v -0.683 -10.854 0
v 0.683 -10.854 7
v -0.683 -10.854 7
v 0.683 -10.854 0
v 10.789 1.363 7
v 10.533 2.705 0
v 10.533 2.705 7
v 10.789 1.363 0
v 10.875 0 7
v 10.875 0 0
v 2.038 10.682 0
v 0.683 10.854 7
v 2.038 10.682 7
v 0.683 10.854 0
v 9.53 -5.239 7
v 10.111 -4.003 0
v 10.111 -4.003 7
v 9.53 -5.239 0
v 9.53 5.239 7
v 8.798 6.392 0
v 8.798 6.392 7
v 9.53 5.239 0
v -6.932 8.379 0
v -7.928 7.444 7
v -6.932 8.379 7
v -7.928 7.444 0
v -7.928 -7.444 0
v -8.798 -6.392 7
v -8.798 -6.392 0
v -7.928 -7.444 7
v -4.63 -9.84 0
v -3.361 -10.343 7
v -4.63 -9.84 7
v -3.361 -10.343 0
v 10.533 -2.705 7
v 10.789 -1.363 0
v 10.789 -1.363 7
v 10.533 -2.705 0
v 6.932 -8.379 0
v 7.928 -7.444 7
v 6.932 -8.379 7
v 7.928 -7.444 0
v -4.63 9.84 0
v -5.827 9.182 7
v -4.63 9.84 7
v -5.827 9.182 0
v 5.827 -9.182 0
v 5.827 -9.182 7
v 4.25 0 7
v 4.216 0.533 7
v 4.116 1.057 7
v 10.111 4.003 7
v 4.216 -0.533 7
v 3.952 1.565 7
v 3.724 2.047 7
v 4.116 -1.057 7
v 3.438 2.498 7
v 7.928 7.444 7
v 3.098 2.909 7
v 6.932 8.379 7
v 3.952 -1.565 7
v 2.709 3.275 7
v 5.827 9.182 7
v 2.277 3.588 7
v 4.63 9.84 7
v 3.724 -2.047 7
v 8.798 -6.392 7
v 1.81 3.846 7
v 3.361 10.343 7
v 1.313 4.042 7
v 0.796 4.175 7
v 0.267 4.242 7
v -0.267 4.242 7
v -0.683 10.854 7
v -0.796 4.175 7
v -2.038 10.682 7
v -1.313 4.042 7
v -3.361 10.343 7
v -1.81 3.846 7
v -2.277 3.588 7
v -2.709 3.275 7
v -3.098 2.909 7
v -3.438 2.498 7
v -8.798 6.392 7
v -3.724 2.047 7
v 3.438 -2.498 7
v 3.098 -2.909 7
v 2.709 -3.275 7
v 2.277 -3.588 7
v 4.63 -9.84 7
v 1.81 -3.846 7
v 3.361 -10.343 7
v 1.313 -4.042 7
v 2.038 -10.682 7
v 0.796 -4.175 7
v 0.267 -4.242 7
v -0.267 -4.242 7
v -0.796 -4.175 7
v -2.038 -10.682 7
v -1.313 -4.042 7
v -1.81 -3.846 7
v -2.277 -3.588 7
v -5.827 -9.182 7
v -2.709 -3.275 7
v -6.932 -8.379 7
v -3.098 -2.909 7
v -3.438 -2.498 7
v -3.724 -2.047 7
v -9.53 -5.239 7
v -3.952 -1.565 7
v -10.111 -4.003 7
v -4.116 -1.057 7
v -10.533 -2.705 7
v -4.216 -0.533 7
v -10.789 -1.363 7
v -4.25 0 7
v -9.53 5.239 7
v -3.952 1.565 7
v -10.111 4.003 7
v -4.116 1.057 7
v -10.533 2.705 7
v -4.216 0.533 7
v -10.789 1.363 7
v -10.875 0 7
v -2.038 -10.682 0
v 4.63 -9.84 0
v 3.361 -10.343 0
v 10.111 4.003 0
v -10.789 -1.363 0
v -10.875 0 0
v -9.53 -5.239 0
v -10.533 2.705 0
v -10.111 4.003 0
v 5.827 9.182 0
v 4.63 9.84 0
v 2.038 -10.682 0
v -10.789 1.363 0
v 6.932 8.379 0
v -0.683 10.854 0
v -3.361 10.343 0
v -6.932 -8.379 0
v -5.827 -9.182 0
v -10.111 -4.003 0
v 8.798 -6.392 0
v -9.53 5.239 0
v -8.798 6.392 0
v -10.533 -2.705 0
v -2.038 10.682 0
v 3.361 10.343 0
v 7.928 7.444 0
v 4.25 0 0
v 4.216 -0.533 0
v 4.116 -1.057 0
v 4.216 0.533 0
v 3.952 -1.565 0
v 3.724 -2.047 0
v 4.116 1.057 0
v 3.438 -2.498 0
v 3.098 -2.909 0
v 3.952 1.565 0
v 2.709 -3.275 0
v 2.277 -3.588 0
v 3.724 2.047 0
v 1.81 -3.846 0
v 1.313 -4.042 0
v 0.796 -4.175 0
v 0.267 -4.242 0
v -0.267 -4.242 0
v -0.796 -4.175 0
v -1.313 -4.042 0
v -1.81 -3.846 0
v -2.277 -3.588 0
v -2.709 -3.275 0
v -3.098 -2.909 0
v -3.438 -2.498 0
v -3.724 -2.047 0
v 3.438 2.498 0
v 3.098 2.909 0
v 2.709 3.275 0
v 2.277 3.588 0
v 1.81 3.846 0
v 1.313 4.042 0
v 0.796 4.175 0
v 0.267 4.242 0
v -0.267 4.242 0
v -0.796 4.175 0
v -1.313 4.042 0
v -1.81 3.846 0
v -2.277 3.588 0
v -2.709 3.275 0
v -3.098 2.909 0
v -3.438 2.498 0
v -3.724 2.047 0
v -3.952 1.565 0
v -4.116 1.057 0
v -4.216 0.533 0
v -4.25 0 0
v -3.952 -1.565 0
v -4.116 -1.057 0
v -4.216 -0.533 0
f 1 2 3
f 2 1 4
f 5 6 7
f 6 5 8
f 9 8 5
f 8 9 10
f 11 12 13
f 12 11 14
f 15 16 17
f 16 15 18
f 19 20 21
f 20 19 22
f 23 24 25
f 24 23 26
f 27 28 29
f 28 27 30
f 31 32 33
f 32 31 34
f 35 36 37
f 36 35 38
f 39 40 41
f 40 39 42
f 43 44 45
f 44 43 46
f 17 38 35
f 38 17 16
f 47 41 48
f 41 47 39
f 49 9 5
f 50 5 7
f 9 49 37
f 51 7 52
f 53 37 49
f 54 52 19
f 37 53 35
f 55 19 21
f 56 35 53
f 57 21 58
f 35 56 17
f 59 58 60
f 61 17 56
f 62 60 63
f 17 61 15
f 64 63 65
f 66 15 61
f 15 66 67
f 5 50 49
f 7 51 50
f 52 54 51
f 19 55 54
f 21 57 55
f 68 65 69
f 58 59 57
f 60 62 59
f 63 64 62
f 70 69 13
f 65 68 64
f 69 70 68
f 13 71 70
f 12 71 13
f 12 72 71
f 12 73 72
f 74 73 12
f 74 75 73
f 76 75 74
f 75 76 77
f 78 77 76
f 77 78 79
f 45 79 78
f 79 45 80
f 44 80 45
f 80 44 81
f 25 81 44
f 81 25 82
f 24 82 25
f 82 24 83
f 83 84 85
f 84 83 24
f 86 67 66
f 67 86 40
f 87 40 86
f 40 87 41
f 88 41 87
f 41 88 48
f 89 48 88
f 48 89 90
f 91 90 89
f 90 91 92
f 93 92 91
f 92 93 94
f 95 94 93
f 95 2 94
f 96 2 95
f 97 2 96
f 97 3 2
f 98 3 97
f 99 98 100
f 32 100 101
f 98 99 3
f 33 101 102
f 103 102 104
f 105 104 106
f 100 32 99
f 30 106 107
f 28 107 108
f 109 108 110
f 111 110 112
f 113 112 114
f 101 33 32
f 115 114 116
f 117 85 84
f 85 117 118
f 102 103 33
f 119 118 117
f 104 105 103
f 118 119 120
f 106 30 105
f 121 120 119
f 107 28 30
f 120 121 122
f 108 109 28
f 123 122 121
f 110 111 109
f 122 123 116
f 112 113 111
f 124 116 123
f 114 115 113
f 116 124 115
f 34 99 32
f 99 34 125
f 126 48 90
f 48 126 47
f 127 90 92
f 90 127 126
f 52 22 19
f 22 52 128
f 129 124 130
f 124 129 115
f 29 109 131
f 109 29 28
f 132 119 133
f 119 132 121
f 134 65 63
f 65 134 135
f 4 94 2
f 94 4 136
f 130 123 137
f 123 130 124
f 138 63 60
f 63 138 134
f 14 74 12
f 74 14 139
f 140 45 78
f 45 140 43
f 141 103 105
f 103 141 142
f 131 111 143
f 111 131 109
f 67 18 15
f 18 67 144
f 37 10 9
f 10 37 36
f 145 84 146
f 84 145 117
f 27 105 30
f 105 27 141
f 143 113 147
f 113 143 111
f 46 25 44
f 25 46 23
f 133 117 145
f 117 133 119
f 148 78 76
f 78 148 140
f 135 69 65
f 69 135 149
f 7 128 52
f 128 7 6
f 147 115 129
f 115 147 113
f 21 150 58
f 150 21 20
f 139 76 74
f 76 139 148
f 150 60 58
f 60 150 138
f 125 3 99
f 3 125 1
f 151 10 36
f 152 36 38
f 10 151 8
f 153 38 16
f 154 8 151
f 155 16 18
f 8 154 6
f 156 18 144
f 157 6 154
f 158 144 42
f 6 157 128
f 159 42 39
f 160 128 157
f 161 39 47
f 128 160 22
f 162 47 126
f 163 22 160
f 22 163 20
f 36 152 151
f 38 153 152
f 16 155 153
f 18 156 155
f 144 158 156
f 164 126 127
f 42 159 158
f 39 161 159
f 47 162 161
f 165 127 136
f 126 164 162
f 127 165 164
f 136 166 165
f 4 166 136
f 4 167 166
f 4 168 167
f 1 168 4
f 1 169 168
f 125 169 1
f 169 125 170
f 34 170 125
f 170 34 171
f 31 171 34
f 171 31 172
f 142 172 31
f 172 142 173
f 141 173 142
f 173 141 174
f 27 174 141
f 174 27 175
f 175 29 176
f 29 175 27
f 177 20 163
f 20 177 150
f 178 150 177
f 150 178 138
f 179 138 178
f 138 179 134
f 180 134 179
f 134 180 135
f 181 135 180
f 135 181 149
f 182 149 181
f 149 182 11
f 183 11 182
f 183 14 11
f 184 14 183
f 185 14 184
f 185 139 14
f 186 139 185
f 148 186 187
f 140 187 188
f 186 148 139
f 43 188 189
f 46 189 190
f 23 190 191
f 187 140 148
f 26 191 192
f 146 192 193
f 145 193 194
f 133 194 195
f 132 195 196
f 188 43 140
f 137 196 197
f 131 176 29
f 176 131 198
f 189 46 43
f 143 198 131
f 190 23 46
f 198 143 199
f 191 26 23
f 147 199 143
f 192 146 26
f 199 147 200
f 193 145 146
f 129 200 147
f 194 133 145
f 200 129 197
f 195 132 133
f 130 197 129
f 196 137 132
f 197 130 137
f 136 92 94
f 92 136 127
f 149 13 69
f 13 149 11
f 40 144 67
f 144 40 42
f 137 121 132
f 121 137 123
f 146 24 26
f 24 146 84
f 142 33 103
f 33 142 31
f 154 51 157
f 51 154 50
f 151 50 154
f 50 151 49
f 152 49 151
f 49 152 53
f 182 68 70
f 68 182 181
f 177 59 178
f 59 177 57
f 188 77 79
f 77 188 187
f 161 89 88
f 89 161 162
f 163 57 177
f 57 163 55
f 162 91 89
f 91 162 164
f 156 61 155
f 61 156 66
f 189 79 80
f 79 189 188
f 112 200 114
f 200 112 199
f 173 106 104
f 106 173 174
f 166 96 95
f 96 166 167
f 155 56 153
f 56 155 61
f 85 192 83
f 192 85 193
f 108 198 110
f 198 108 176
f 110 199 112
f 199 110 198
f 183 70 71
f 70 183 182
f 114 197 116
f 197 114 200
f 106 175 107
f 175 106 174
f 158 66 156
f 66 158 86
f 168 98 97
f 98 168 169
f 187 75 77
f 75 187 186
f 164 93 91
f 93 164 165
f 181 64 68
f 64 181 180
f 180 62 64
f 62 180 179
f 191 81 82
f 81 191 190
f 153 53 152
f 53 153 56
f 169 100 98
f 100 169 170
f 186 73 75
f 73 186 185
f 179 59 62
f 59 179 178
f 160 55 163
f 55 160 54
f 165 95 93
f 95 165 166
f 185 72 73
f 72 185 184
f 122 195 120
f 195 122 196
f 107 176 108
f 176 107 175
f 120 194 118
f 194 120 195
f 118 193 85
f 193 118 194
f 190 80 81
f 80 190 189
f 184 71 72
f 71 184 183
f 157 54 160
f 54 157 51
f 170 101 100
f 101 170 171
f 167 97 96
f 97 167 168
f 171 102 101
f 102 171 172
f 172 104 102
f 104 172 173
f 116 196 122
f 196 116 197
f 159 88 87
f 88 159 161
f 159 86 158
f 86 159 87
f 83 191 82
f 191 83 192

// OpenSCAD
// Bearing Customiser (http://www.thingiverse.com/thing:313437)
// *********************************************************************************
// Version history:
// Author:			Date: 			Description:
// Whitecoat		2014-04-28		Initial build
// 
// *********************************************************************************
// customiser script

// Bearing Part Number
PartNo = 608;  // [ 603,  604, 605,606, 607, 608, 609, 623, 624, 625, 626, 627, 628, 629, 633, 634, 635, 636, 637, 638, 639, 673, 674, 675, 676, 677,  678,  683,  684,  685,  686,  687,  688,  689,  693,  694,  695,  696,  697,  698,  699,  6000, 6001, 6002, 6003, 6004, 6005, 6006, 6007, 6008, 6009, 6010, 6011, 6012, 6013, 6014, 6015, 6016, 6017, 6018, 6019, 6020, 6021, 6022, 6024, 6026, 6028, 6030, 6200, 6201, 6202, 6203, 6204, 6205, 6206, 6207, 6208, 6209, 6210, 6211, 6212, 6213, 6214, 6215, 6216, 6217, 6218, 6219, 6220, 6221, 6222, 6224, 6226, 6228, 6230, 6300, 6301, 6302, 6303, 6304, 6305, 6306, 6307, 6308, 6309, 6310, 6311, 6312, 6313, 6314, 6315, 6316, 6317, 6318, 6319, 6320, 6321, 6322, 6324, 6326, 6328, 6330, 6701, 6702, 6703, 6704, 6705, 6706, 6707, 6800, 6801, 6802, 6803, 6804, 6805, 6806, 6807, 6808, 6809, 6810, 6811, 6812, 6813, 6814, 6815, 6816, 6817, 6818, 6819, 6820, 6821, 6822, 6824, 6826, 6828, 6830, 6200, 6201, 6202, 6203, 6204, 6205, 6206, 6207, 6208, 6209, 6210, 6211, 6212, 6213, 6214, 6215, 6216, 6217, 6218, 6219, 6220, 6221, 6222, 6224, 6226, 6228, 6230, 6300, 6301, 6302, 6303, 6304, 6305, 6306, 6307, 6308, 6309, 6310, 6311, 6312, 6313, 6314, 6315, 6316, 6317, 6318, 6319, 6320, 6321, 6322, 6324, 6326, 6328, 6330, 6701, 6702, 6703, 6704,  6705, 6706, 6707, 6800, 6801, 6802, 6803, 6804, 6805, 6806, 6807, 6808, 6809, 6810, 6811, 6812, 6813, 6814, 6815, 6816, 6817, 6818, 6819, 6820, 6821, 6822, 6824, 6826, 6828, 6830, 6900, 6901, 6902, 6903, 6904, 6905, 6906, 6907, 6908, 6909, 6910, 6911, 6912, 6913, 6914, 6915, 6916, 6917, 6918, 6919, 6920, 6921, 6922, 6924, 6926, 6928, 6930, 16001, 16002, 16003, 16004, 16005, 16006, 16007, 16008, 16009, 16010, 16011, 16012, 16013, 16014, 16015, 16016, 16017, 16018, 16019, 16020, 16021, 16022 ]
 

// Printer Tolerance (in mm).  This makes the print just a bit smaller to account for inaccuracy in printing. 
PrintTolerance = 0.25; 

fake_bearing(BearingPartNoToDim(PartNo),PrintTolerance);


// *********************************************************************************
//  Pasted in a bearing library below this point so that there was a single script 
//  for the customiser app
// *********************************************************************************


// Bearing Library
// *********************************************************************************
// Version history:
// Author:			Date: 			Description:
// Whitecoat		2014-02-21		Initial build
// 
// *********************************************************************************
// Included Functions:
// [d, D, B] = BearingPartNoToDim(PartNo);  	//Returns Dimensions given Part Number
//
// *********************************************************************************
// Public Modules:
// fake_bearing([d, D, B],Tolerance);  	 	//Creates Bearing shape for given dimensions
//															// or: fake_bearing(BearingPartNoToDim(608));
// 
// BearingHole(p_bearing_size,p_tolerance)
// *********************************************************************************
// *********************************************************************************
// Included Internal Modules:
//	FakeBearingTest1();  			//Unit Test 1 - Fake Bearing

module FakeBearingTest1()
	{
	Tolerance = 1.0; 		
	fake_bearing([9,12,2],Tolerance);
	}




// build a fake bearing using size vector [d (Inner Diamater), D (Outer Diamater), B (Width)]
// ----------------------------------------------------------------
// This module just creates a cored cylinder in the same of a bearing.
module fake_bearing(p_bearing_size,p_tolerance=0.25)
	{
	// internal parameters
	l_diff_tol = 0.1;  	// a tollerance added to difference operations 
							 	// to ensure surface is subtracted

	// build
	difference()
		{
		cylinder(r=(p_bearing_size[1]-p_tolerance)/2,h=p_bearing_size[2],$fn=50);
		translate([0,0,-l_diff_tol])
			{
			cylinder(r=(p_bearing_size[0])/2+p_tolerance,h=p_bearing_size[2]+l_diff_tol*2,$fn=50);
			}
		}
	}

// BearingHole [d (Inner Diamater), D (Outer Diamater), B (Width)]
// ----------------------------------------------------------------
// This module is intended for subtraction in a difference to make a hole for a bearing
module BearingHole(p_bearing_size,p_tolerance=0.25)
	{
	// internal parameters
	l_diff_tol = 0.1;  	// a tollerance added to difference operations 
							 	// to ensure surface is subtracted

	// build
	difference()
		{
		cylinder(r=(p_bearing_size[1]+p_tolerance)/2,h=p_bearing_size[2],$fn=50);
		}
	}

// bearing PartNo to Dimension conversion - result [d, D, B] in mm
// ----------------------------------------------------------------
// I did find something like this in the generic bearing library with MCAD, but 
// it had a farily limited set of part numbers, I wanted a more complete 
// table for this purpose, so I wrote my own.
function BearingPartNoToDim(PartNo) =
// 600 series (ZZ)
	PartNo == 603 ? [3, 9,  5]:
	PartNo == 604 ? [4, 12, 4]:
	PartNo == 605 ? [5, 14, 5]:
	PartNo == 606 ? [6, 17, 6]:
	PartNo == 607 ? [7, 19, 6]:
	PartNo == 608 ? [8, 22, 7]:
	PartNo == 609 ? [9, 24, 7]:
	PartNo == 623 ? [3, 10, 4]:
	PartNo == 624 ? [4, 13, 5]:
	PartNo == 625 ? [5, 16, 5]:
	PartNo == 626 ? [6, 19, 6]:
	PartNo == 627 ? [7, 22, 7]:
	PartNo == 628 ? [8, 22, 7]:
	PartNo == 629 ? [9, 22, 7]:
	PartNo == 633 ? [3, 13, 5]:
	PartNo == 634 ? [4, 16, 5]:
	PartNo == 635 ? [5, 19, 6]:
	PartNo == 636 ? [6, 22, 7]:
	PartNo == 637 ? [7, 26, 9]:
	PartNo == 638 ? [8, 28, 9]:
	PartNo == 639 ? [9, 30, 10]:
	PartNo == 673 ? [3, 6, 2.5]:
	PartNo == 674 ? [4, 7, 2.5]:
	PartNo == 675 ? [5, 8, 2.5]:
	PartNo == 676 ? [6, 10, 3]:
	PartNo == 677 ? [7, 11, 3]:
	PartNo == 678 ? [8, 12, 3.5]:
	PartNo == 683 ? [3, 7, 3]:
	PartNo == 684 ? [4, 9, 4]:
	PartNo == 685 ? [5, 11, 5]:
	PartNo == 686 ? [6, 13, 5]:
	PartNo == 687 ? [7, 14, 5]:
	PartNo == 688 ? [8, 16, 5]:
	PartNo == 689 ? [9, 17, 5]:
	PartNo == 693 ? [3, 8, 4]:
	PartNo == 694 ? [4, 11, 4]:
	PartNo == 695 ? [5, 13, 4]:
	PartNo == 696 ? [6, 15, 5]:
	PartNo == 697 ? [7, 17, 5]:
	PartNo == 698 ? [8, 19, 6]:
	PartNo == 699 ? [9, 20, 6]:
	PartNo == 6000 ? [10,  26,  8]:
	PartNo == 6001 ? [12,  28,  8]:
	PartNo == 6002 ? [15,  32,  9]:
	PartNo == 6003 ? [17,  35,  10]:
	PartNo == 6004 ? [20,  42,  12]:
	PartNo == 6005 ? [25,  47,  12]:
	PartNo == 6006 ? [30,  55,  13]:
	PartNo == 6007 ? [35,  62,  14]:
	PartNo == 6008 ? [40,  68,  15]:
	PartNo == 6009 ? [45,  75,  16]:
	PartNo == 6010 ? [50,  80,  16]:
	PartNo == 6011 ? [55,  90,  18]:
	PartNo == 6012 ? [60,  95,  18]:
	PartNo == 6013 ? [65,  100,  18]:
	PartNo == 6014 ? [70,  110,  20]:
	PartNo == 6015 ? [75,  115,  20]:
	PartNo == 6016 ? [80,  125,  22]:
	PartNo == 6017 ? [85,  130,  22]:
	PartNo == 6018 ? [90,  140,  24]:
	PartNo == 6019 ? [95,  145,  24]:
	PartNo == 6020 ? [100,  150,  24]:
	PartNo == 6021 ? [105,  160,  26]:
	PartNo == 6022 ? [110,  170,  28]:
	PartNo == 6024 ? [120,  180,  28]:
	PartNo == 6026 ? [130,  200,  33]:
	PartNo == 6028 ? [140,  210,  33]:
	PartNo == 6030 ? [150,  225,  35]:
	PartNo == 6200 ? [10,  30,  9]:
	PartNo == 6201 ? [12,  32,  10]:
	PartNo == 6202 ? [15,  35,  11]:
	PartNo == 6203 ? [17,  40,  12]:
	PartNo == 6204 ? [20,  47,  14]:
	PartNo == 6205 ? [25,  52,  15]:
	PartNo == 6206 ? [30,  62,  16]:
	PartNo == 6207 ? [35,  72,  17]:
	PartNo == 6208 ? [40,  80,  18]:
	PartNo == 6209 ? [45,  85,  19]:
	PartNo == 6210 ? [50,  90,  20]:
	PartNo == 6211 ? [55,  100,  21]:
	PartNo == 6212 ? [60,  110,  22]:
	PartNo == 6213 ? [65,  120,  23]:
	PartNo == 6214 ? [70,  125,  24]:
	PartNo == 6215 ? [75,  130,  25]:
	PartNo == 6216 ? [80,  140,  26]:
	PartNo == 6217 ? [85,  150,  28]:
	PartNo == 6218 ? [90,  160,  30]:
	PartNo == 6219 ? [95,  170,  32]:
	PartNo == 6220 ? [100,  180,  34]:
	PartNo == 6221 ? [105,  190,  36]:
	PartNo == 6222 ? [110,  200,  38]:
	PartNo == 6224 ? [120,  215,  40]:
	PartNo == 6226 ? [130,  230,  40]:
	PartNo == 6228 ? [140,  250,  42]:
	PartNo == 6230 ? [150,  270,  45]:
	PartNo == 6300 ? [10,  35,  11]:
	PartNo == 6301 ? [12,  37,  12]:
	PartNo == 6302 ? [15,  42,  13]:
	PartNo == 6303 ? [17,  47,  14]:
	PartNo == 6304 ? [20,  52,  15]:
	PartNo == 6305 ? [25,  62,  17]:
	PartNo == 6306 ? [30,  72,  19]:
	PartNo == 6307 ? [35,  80,  21]:
	PartNo == 6308 ? [40,  90,  23]:
	PartNo == 6309 ? [45,  100,  25]:
	PartNo == 6310 ? [50,  110,  27]:
	PartNo == 6311 ? [55,  120,  29]:
	PartNo == 6312 ? [60,  130,  31]:
	PartNo == 6313 ? [65,  140,  33]:
	PartNo == 6314 ? [70,  150,  35]:
	PartNo == 6315 ? [75,  160,  37]:
	PartNo == 6316 ? [80,  170,  39]:
	PartNo == 6317 ? [85,  180,  41]:
	PartNo == 6318 ? [90,  190,  43]:
	PartNo == 6319 ? [95,  200,  45]:
	PartNo == 6320 ? [100,  215,  47]:
	PartNo == 6321 ? [105,  225,  49]:
	PartNo == 6322 ? [110,  240,  50]:
	PartNo == 6324 ? [120,  260,  55]:
	PartNo == 6326 ? [130,  280,  58]:
	PartNo == 6328 ? [140,  300,  62]:
	PartNo == 6330 ? [150,  320,  65]:
	PartNo == 6701 ? [12,  18,  4]:
	PartNo == 6702 ? [15,  21,  4]:
	PartNo == 6703 ? [17,  23,  4]:
	PartNo == 6704 ? [20,  27,  4]:
	PartNo == 6705 ? [25,  32,  4]:
	PartNo == 6706 ? [30,  37,  4]:
	PartNo == 6707 ? [35,  44,  5]:
	PartNo == 6800 ? [10,  19,  5]:
	PartNo == 6801 ? [12,  21,  5]:
	PartNo == 6802 ? [15,  24,  5]:
	PartNo == 6803 ? [17,  26,  5]:
	PartNo == 6804 ? [20,  32,  7]:
	PartNo == 6805 ? [25,  37,  7]:
	PartNo == 6806 ? [30,  42,  7]:
	PartNo == 6807 ? [35,  47,  7]:
	PartNo == 6808 ? [40,  52,  7]:
	PartNo == 6809 ? [45,  58,  7]:
	PartNo == 6810 ? [50,  65,  7]:
	PartNo == 6811 ? [55,  72,  9]:
	PartNo == 6812 ? [60,  78,  10]:
	PartNo == 6813 ? [65,  85,  10]:
	PartNo == 6814 ? [70,  90,  10]:
	PartNo == 6815 ? [75,  95,  10]:
	PartNo == 6816 ? [80,  100,  10]:
	PartNo == 6817 ? [85,  110,  13]:
	PartNo == 6818 ? [90,  115,  13]:
	PartNo == 6819 ? [95,  120,  13]:
	PartNo == 6820 ? [100,  125,  13]:
	PartNo == 6821 ? [105,  130,  13]:
	PartNo == 6822 ? [110,  140,  16]:
	PartNo == 6824 ? [120,  150,  16]:
	PartNo == 6826 ? [130,  165,  18]:
	PartNo == 6828 ? [140,  175,  18]:
	PartNo == 6830 ? [150,  190,  20]:
	PartNo == 6200 ? [10,  30,  9]:
	PartNo == 6201 ? [12,  32,  10]:
	PartNo == 6202 ? [15,  35,  11]:
	PartNo == 6203 ? [17,  40,  12]:
	PartNo == 6204 ? [20,  47,  14]:
	PartNo == 6205 ? [25,  52,  15]:
	PartNo == 6206 ? [30,  62,  16]:
	PartNo == 6207 ? [35,  72,  17]:
	PartNo == 6208 ? [40,  80,  18]:
	PartNo == 6209 ? [45,  85,  19]:
	PartNo == 6210 ? [50,  90,  20]:
	PartNo == 6211 ? [55,  100,  21]:
	PartNo == 6212 ? [60,  110,  22]:
	PartNo == 6213 ? [65,  120,  23]:
	PartNo == 6214 ? [70,  125,  24]:
	PartNo == 6215 ? [75,  130,  25]:
	PartNo == 6216 ? [80,  140,  26]:
	PartNo == 6217 ? [85,  150,  28]:
	PartNo == 6218 ? [90,  160,  30]:
	PartNo == 6219 ? [95,  170,  32]:
	PartNo == 6220 ? [100,  180,  34]:
	PartNo == 6221 ? [105,  190,  36]:
	PartNo == 6222 ? [110,  200,  38]:
	PartNo == 6224 ? [120,  215,  40]:
	PartNo == 6226 ? [130,  230,  40]:
	PartNo == 6228 ? [140,  250,  42]:
	PartNo == 6230 ? [150,  270,  45]:
	PartNo == 6300 ? [10,  35,  11]:
	PartNo == 6301 ? [12,  37,  12]:
	PartNo == 6302 ? [15,  42,  13]:
	PartNo == 6303 ? [17,  47,  14]:
	PartNo == 6304 ? [20,  52,  15]:
	PartNo == 6305 ? [25,  62,  17]:
	PartNo == 6306 ? [30,  72,  19]:
	PartNo == 6307 ? [35,  80,  21]:
	PartNo == 6308 ? [40,  90,  23]:
	PartNo == 6309 ? [45,  100,  25]:
	PartNo == 6310 ? [50,  110,  27]:
	PartNo == 6311 ? [55,  120,  29]:
	PartNo == 6312 ? [60,  130,  31]:
	PartNo == 6313 ? [65,  140,  33]:
	PartNo == 6314 ? [70,  150,  35]:
	PartNo == 6315 ? [75,  160,  37]:
	PartNo == 6316 ? [80,  170,  39]:
	PartNo == 6317 ? [85,  180,  41]:
	PartNo == 6318 ? [90,  190,  43]:
	PartNo == 6319 ? [95,  200,  45]:
	PartNo == 6320 ? [100,  215,  47]:
	PartNo == 6321 ? [105,  225,  49]:
	PartNo == 6322 ? [110,  240,  50]:
	PartNo == 6324 ? [120,  260,  55]:
	PartNo == 6326 ? [130,  280,  58]:
	PartNo == 6328 ? [140,  300,  62]:
	PartNo == 6330 ? [150,  320,  65]:
	PartNo == 6701 ? [12,  18,  4]:
	PartNo == 6702 ? [15,  21,  4]:
	PartNo == 6703 ? [17,  23,  4]:
	PartNo == 6704 ? [20,  27,  4]:
	PartNo == 6705 ? [25,  32,  4]:
	PartNo == 6706 ? [30,  37,  4]:
	PartNo == 6707 ? [35,  44,  5]:
	PartNo == 6800 ? [10,  19,  5]:
	PartNo == 6801 ? [12,  21,  5]:
	PartNo == 6802 ? [15,  24,  5]:
	PartNo == 6803 ? [17,  26,  5]:
	PartNo == 6804 ? [20,  32,  7]:
	PartNo == 6805 ? [25,  37,  7]:
	PartNo == 6806 ? [30,  42,  7]:
	PartNo == 6807 ? [35,  47,  7]:
	PartNo == 6808 ? [40,  52,  7]:
	PartNo == 6809 ? [45,  58,  7]:
	PartNo == 6810 ? [50,  65,  7]:
	PartNo == 6811 ? [55,  72,  9]:
	PartNo == 6812 ? [60,  78,  10]:
	PartNo == 6813 ? [65,  85,  10]:
	PartNo == 6814 ? [70,  90,  10]:
	PartNo == 6815 ? [75,  95,  10]:
	PartNo == 6816 ? [80,  100,  10]:
	PartNo == 6817 ? [85,  110,  13]:
	PartNo == 6818 ? [90,  115,  13]:
	PartNo == 6819 ? [95,  120,  13]:
	PartNo == 6820 ? [100,  125,  13]:
	PartNo == 6821 ? [105,  130,  13]:
	PartNo == 6822 ? [110,  140,  16]:
	PartNo == 6824 ? [120,  150,  16]:
	PartNo == 6826 ? [130,  165,  18]:
	PartNo == 6828 ? [140,  175,  18]:
	PartNo == 6830 ? [150,  190,  20]:
	PartNo == 6900 ? [10,  22,  6]:
	PartNo == 6901 ? [12,  24,  6]:
	PartNo == 6902 ? [15,  28,  7]:
	PartNo == 6903 ? [17,  30,  7]:
	PartNo == 6904 ? [20,  37,  9]:
	PartNo == 6905 ? [25,  42,  9]:
	PartNo == 6906 ? [30,  47,  9]:
	PartNo == 6907 ? [35,  55,  10]:
	PartNo == 6908 ? [40,  62,  12]:
	PartNo == 6909 ? [45,  68,  12]:
	PartNo == 6910 ? [50,  72,  12]:
	PartNo == 6911 ? [55,  80,  13]:
	PartNo == 6912 ? [60,  85,  13]:
	PartNo == 6913 ? [65,  90,  13]:
	PartNo == 6914 ? [70,  100,  16]:
	PartNo == 6915 ? [75,  105,  16]:
	PartNo == 6916 ? [80,  110,  16]:
	PartNo == 6917 ? [85,  120,  18]:
	PartNo == 6918 ? [90,  125,  18]:
	PartNo == 6919 ? [95,  130,  18]:
	PartNo == 6920 ? [100,  140,  20]:
	PartNo == 6921 ? [105,  145,  20]:
	PartNo == 6922 ? [110,  150,  20]:
	PartNo == 6924 ? [120,  165,  22]:
	PartNo == 6926 ? [130,  180,  24]:
	PartNo == 6928 ? [140,  190,  24]:
	PartNo == 6930 ? [150,  210,  28]:
	PartNo == 16001 ? [12,  28,  7]:
	PartNo == 16002 ? [15,  32,  8]:
	PartNo == 16003 ? [17,  35,  8]:
	PartNo == 16004 ? [20,  42,  8]:
	PartNo == 16005 ? [25,  47,  8]:
	PartNo == 16006 ? [30,  55,  9]:
	PartNo == 16007 ? [35,  62,  9]:
	PartNo == 16008 ? [40,  68,  9]:
	PartNo == 16009 ? [45,  75,  10]:
	PartNo == 16010 ? [50,  80,  10]:
	PartNo == 16011 ? [55,  90,  11]:
	PartNo == 16012 ? [60,  95,  11]:
	PartNo == 16013 ? [65,  100,  11]:
	PartNo == 16014 ? [70,  110,  13]:
	PartNo == 16015 ? [75,  115,  13]:
	PartNo == 16016 ? [80,  125,  14]:
	PartNo == 16017 ? [85,  130,  14]:
	PartNo == 16018 ? [90,  140,  16]:
	PartNo == 16019 ? [95,  145,  16]:
	PartNo == 16020 ? [100,  150,  16]:
	PartNo == 16021 ? [105,  160,  18]:
	PartNo == 16022 ? [110,  170,  19]:
	// default
   BearingPartNoToDim(608); // default to 608
